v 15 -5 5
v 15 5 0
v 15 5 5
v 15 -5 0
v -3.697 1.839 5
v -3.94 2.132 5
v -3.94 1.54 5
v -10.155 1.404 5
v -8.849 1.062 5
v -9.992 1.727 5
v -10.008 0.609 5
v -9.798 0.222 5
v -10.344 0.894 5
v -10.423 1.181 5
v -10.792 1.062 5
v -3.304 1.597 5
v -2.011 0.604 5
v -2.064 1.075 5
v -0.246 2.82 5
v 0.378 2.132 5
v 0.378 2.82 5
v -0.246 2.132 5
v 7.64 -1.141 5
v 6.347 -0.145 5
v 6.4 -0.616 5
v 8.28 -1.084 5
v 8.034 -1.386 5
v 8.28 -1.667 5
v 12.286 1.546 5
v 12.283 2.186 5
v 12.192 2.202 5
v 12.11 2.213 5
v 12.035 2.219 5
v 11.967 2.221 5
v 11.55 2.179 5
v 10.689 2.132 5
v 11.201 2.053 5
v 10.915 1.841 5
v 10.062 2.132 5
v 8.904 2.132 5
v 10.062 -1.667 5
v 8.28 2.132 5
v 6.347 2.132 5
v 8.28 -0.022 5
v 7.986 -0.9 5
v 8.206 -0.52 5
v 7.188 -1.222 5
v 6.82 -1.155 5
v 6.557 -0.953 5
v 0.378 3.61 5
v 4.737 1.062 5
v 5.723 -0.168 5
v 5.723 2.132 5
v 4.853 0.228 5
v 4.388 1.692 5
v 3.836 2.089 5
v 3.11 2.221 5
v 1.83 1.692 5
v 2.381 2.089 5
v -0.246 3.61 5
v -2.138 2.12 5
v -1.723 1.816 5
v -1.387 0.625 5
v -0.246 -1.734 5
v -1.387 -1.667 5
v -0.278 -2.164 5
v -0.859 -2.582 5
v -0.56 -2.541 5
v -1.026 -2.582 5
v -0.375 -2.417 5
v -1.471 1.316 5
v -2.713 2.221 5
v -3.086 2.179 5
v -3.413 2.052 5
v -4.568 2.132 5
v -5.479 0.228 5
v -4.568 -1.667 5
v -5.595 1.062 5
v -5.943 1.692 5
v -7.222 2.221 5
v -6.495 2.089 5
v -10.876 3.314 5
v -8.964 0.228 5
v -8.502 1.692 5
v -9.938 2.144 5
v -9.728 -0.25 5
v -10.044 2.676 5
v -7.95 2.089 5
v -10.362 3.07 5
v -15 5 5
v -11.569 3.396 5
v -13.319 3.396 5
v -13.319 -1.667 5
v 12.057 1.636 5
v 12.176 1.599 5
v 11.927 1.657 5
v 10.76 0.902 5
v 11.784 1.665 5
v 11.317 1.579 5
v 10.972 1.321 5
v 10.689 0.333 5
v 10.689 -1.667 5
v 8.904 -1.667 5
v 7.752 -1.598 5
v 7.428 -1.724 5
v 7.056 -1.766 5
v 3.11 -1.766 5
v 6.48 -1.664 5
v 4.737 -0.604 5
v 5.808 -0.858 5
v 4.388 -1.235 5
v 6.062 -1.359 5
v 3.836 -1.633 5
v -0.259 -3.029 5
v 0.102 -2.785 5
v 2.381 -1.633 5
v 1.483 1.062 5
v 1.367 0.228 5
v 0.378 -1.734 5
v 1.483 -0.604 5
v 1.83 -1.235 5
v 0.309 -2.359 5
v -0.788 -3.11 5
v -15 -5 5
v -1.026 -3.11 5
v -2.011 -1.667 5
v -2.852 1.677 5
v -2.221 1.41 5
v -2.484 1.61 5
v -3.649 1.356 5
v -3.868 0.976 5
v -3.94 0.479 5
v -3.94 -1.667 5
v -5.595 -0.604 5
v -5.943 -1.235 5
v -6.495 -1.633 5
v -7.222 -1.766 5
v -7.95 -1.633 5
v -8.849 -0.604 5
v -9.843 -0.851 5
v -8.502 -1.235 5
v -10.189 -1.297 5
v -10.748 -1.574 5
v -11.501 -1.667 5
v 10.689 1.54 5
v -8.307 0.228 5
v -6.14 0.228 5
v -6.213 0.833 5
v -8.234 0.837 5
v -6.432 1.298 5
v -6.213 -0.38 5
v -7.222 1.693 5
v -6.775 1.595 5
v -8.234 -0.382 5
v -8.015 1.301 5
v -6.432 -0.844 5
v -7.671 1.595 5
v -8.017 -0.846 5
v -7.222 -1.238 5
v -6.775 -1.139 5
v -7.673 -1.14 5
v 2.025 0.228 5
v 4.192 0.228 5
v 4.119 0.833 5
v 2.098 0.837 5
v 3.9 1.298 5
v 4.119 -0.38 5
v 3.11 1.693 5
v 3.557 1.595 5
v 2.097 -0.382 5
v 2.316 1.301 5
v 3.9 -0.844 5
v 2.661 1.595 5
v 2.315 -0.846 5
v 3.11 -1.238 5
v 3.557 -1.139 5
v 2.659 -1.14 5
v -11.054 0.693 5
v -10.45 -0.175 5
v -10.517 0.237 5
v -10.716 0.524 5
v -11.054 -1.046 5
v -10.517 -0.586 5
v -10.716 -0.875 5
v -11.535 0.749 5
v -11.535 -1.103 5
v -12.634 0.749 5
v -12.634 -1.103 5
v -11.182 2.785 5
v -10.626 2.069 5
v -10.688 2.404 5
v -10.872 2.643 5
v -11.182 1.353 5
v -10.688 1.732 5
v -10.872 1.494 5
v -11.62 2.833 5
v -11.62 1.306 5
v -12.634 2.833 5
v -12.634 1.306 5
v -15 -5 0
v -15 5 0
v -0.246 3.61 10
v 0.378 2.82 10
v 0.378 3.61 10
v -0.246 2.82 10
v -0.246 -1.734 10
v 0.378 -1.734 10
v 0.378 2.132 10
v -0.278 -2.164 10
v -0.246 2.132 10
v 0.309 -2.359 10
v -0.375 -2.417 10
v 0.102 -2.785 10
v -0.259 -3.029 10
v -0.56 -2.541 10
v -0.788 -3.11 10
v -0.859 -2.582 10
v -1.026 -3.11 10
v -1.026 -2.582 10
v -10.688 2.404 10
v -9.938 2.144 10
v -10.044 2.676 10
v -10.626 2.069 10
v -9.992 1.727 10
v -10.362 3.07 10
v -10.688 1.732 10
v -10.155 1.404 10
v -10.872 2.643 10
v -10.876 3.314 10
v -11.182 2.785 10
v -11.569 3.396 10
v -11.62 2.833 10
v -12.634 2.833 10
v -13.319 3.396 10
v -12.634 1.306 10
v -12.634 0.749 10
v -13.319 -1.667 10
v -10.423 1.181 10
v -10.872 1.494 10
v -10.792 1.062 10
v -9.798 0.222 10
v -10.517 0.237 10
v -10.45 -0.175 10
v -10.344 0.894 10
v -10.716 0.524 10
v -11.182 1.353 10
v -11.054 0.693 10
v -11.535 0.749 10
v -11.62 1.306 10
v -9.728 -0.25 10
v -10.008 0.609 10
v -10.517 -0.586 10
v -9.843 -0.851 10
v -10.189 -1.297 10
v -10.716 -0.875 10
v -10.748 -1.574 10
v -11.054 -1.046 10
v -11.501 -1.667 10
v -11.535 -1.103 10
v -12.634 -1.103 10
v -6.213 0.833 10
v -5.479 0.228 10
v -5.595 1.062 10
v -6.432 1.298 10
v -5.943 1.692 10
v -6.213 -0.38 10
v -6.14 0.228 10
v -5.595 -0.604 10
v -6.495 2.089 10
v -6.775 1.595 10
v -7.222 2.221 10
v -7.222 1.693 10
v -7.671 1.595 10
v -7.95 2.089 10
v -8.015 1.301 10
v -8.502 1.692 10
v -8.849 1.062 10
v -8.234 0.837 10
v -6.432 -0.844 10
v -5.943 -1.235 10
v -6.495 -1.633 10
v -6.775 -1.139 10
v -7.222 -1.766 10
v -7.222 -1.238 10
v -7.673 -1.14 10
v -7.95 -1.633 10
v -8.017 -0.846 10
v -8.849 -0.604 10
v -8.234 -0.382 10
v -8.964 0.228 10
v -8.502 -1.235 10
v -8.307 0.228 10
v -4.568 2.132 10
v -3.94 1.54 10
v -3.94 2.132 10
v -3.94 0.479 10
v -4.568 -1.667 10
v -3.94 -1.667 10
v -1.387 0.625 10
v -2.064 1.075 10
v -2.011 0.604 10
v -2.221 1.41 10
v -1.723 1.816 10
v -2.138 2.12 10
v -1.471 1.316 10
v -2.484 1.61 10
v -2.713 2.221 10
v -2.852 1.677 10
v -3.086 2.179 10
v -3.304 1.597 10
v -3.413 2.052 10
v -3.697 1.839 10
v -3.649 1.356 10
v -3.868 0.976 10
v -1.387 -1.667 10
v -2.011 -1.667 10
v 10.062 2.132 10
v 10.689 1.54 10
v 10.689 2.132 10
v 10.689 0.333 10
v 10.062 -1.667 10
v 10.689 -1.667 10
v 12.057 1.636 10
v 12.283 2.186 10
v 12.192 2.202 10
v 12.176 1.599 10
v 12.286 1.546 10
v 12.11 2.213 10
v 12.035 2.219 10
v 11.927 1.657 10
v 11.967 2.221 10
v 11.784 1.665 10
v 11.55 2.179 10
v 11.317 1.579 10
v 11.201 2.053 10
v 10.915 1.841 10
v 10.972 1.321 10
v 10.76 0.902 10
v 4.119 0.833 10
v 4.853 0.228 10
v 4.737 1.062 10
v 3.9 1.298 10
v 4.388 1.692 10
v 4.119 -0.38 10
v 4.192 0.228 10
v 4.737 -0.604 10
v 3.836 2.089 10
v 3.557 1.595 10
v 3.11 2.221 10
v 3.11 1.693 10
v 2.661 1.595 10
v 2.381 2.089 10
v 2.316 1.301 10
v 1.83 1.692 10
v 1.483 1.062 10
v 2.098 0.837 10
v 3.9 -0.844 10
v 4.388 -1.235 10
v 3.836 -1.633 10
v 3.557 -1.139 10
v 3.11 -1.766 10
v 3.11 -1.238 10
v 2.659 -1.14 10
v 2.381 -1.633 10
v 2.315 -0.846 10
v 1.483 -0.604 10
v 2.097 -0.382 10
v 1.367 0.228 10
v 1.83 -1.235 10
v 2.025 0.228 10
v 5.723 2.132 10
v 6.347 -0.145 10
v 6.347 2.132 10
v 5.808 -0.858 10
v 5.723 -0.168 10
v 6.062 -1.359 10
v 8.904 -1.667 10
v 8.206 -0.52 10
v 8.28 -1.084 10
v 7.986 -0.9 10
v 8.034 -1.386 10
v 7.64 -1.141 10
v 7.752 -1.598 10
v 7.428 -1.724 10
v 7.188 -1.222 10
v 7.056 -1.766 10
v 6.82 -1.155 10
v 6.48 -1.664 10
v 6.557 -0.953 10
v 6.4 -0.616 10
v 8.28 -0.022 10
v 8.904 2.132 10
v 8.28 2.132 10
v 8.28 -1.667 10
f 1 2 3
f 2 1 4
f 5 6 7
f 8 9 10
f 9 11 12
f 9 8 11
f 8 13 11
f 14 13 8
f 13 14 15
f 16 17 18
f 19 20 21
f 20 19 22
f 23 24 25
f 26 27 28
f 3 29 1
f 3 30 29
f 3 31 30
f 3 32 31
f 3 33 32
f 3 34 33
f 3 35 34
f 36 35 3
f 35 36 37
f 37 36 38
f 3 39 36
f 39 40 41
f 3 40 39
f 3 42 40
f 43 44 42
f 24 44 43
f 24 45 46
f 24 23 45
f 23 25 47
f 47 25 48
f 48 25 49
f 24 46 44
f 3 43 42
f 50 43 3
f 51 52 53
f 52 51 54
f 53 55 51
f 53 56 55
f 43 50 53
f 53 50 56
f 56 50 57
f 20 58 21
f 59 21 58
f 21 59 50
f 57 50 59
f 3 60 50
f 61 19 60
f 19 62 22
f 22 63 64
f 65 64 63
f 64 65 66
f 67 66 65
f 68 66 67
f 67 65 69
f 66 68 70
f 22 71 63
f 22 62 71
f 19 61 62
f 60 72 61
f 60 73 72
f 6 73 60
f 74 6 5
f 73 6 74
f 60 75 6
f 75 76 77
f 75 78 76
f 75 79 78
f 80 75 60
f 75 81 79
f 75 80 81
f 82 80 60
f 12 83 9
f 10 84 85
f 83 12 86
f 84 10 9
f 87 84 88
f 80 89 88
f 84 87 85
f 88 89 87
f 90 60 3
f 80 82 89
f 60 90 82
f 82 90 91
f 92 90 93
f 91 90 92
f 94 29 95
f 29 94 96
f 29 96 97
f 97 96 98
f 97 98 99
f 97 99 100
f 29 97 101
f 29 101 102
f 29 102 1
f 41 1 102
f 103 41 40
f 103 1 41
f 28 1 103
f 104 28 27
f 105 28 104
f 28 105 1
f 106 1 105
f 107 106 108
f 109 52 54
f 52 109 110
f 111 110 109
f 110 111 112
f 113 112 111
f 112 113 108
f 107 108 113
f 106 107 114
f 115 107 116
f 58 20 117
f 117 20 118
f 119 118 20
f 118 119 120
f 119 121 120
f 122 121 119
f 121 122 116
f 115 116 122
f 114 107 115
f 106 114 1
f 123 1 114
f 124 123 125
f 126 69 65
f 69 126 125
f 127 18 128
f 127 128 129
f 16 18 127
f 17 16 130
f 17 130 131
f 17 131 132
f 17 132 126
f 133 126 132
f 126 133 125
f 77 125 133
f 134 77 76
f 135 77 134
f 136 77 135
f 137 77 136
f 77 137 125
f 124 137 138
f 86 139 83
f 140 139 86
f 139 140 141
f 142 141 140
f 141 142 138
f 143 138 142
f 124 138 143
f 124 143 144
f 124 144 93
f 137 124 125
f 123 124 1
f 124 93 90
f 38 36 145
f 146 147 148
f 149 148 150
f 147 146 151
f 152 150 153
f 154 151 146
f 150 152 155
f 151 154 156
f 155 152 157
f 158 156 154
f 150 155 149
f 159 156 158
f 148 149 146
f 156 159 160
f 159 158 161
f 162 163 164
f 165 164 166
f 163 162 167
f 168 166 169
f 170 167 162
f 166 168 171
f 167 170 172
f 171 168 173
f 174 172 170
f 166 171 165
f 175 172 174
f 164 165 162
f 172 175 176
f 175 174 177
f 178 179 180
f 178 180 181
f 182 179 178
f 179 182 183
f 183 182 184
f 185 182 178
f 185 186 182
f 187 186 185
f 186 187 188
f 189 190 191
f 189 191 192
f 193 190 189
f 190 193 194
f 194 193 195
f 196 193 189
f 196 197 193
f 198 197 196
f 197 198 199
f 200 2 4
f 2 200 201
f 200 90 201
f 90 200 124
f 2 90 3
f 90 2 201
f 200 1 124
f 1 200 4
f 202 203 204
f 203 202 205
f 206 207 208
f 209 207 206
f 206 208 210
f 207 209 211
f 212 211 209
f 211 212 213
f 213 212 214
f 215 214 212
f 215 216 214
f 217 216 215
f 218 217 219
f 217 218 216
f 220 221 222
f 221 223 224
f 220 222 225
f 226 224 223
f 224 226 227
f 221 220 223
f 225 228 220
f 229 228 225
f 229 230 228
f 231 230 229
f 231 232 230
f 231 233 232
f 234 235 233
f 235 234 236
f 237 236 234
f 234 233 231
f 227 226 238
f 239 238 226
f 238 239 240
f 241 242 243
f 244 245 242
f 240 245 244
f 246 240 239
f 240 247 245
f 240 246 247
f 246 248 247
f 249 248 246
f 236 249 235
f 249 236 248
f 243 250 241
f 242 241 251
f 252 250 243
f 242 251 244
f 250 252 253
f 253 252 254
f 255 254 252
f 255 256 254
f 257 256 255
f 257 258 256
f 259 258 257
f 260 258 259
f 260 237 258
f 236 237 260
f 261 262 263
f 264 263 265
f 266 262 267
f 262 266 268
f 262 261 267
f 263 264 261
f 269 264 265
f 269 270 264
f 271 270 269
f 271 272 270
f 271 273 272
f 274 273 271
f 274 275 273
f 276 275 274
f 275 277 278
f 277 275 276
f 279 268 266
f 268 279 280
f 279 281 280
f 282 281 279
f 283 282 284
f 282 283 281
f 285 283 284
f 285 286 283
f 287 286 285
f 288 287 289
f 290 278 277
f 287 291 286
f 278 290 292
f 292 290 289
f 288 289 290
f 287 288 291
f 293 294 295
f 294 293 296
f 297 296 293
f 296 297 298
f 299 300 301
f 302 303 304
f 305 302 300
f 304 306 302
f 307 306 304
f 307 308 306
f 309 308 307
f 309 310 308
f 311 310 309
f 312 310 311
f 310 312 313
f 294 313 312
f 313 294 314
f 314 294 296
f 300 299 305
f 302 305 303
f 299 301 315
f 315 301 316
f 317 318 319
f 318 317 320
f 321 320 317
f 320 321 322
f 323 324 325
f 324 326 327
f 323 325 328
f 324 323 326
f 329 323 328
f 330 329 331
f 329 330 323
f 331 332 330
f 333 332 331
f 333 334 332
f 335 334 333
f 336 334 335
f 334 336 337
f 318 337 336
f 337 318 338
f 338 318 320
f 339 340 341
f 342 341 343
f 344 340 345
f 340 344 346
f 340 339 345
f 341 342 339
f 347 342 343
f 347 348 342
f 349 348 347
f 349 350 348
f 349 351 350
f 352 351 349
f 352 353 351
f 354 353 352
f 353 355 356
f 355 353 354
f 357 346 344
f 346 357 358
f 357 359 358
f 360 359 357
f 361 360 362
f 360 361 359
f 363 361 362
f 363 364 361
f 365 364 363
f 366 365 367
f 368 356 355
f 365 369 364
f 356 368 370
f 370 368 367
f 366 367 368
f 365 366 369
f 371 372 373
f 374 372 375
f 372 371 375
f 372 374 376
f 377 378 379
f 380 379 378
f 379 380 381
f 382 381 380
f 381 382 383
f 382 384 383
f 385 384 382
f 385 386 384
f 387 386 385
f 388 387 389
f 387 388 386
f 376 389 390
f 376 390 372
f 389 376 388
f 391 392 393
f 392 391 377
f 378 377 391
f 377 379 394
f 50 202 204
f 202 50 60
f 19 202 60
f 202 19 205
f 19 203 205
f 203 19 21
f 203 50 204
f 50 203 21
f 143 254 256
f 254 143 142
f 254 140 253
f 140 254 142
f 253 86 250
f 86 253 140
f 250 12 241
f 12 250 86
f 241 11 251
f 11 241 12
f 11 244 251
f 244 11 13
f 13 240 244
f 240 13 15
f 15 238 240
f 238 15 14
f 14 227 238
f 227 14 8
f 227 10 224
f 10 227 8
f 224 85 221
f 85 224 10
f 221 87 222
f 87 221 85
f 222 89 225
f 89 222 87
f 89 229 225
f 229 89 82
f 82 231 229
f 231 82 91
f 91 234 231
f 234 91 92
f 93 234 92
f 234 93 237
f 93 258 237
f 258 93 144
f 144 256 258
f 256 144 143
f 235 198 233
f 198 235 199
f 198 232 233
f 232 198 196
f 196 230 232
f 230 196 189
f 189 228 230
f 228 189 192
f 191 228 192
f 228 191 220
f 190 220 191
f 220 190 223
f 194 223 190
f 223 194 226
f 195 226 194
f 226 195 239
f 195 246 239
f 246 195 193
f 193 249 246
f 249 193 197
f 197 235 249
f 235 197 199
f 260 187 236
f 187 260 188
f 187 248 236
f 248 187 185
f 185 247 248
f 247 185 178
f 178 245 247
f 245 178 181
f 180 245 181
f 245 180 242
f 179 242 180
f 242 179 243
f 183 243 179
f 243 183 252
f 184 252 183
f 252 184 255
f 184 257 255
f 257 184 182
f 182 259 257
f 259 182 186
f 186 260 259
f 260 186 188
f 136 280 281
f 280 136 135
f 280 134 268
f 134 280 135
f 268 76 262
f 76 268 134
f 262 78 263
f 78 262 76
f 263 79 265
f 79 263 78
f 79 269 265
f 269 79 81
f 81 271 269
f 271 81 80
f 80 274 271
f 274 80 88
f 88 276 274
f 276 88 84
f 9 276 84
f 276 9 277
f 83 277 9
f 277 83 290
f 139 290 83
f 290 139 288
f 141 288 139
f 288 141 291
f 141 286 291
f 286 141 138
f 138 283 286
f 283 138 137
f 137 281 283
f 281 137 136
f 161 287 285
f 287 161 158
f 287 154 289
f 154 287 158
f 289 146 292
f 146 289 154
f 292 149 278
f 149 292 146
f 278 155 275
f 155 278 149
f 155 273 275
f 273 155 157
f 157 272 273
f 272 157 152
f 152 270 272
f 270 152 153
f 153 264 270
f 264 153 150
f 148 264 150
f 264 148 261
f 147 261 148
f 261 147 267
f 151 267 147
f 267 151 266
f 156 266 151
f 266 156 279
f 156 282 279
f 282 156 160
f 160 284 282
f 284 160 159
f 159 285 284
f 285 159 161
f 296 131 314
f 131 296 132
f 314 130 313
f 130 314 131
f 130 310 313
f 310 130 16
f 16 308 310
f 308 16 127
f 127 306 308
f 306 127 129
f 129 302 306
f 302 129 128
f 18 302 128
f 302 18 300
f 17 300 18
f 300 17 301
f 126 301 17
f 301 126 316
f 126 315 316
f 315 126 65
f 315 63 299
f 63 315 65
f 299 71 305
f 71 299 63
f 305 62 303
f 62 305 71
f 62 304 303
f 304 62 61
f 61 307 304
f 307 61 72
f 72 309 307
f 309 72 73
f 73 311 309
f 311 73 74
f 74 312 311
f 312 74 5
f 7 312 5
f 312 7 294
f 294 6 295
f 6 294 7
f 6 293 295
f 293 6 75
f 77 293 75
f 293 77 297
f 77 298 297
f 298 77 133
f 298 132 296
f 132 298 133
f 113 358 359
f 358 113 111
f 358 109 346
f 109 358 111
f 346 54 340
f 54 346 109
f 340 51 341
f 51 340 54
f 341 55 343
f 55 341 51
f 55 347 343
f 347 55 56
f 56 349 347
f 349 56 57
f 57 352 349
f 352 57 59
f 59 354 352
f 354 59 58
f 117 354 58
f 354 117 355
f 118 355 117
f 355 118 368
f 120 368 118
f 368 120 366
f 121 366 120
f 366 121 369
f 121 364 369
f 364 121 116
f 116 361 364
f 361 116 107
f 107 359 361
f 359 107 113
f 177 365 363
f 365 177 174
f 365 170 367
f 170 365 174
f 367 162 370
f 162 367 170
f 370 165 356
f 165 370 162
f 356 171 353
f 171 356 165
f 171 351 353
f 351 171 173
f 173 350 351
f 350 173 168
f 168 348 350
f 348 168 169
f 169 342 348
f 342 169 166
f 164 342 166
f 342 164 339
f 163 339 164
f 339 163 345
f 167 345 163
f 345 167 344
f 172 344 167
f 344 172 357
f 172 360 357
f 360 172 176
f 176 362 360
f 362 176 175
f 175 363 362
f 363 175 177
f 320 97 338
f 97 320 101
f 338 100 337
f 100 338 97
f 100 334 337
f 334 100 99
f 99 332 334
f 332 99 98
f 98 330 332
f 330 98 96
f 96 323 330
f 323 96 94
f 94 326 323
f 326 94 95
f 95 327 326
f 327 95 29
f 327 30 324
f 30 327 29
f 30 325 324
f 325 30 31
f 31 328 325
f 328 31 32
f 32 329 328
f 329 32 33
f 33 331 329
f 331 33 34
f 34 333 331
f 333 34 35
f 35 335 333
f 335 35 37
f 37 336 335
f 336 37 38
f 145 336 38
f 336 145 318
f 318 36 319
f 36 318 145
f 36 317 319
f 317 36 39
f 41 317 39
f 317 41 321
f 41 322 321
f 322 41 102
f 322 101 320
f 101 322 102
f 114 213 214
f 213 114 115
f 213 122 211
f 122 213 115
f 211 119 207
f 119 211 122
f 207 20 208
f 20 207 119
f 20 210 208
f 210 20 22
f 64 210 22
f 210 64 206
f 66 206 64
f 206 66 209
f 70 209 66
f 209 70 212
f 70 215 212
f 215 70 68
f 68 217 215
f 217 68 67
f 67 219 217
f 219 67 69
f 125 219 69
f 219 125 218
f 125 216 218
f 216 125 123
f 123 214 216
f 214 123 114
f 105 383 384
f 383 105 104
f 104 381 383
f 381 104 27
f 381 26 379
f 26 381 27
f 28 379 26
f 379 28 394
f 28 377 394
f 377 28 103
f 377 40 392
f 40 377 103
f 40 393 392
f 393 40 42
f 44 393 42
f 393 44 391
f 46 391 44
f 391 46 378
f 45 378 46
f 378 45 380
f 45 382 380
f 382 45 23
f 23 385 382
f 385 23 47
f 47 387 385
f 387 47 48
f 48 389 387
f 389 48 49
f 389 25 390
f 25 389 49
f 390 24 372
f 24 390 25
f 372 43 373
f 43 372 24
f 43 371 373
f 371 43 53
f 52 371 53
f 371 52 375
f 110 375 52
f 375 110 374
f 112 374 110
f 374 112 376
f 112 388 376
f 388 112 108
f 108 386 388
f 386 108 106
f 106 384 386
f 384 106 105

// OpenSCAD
$fn = 2; 
texte_a_inserer = "Bonjour"; 
taille = 5; 
police = "DejaVuSans"; //[[Abril Fatface,Aclonica,Acme,Advent Pro,Akronim,Aladin,Alegreya,Alegreya Sans,Alegreya SC,Alex Brush,Alfa Slab One,Alice,Amaranth,Architects Daughter,Archivo Black,Archivo Narrow,Arimo,Arvo,Asap,Astloch,Asul,Averia Libre,Averia Serif Libre,Bangers,Basic,Belgrano,Berkshire Swash,Bigshot One,Bilbo Swash Caps,Black Ops One,Bonbon,Bowlby One SC,Brawler,Bubblegum Sans,Butterfly Kids,Cabin Condensed,Caesar Dressing,Cagliostro,Calligraffitti,Capriola,Carter One,Changa One,Chango,Chelsea Market,Cherry Cream Soda,Chewy,Chicle,Chivo,Clicker Script,Coming Soon,Concert One,Condiment,Cookie,Courgette,Covered By Your Grace,Crimson Text,Dancing Script,DejaVu Sans,DejaVu Serif,Dhurjati,Doppio One,Dosis,Droid Sans,Eagle Lake,Electrolize,Emilys Candy,Encode Sans,Encode Sans Compressed,Euphoria Script,Exo,Exo 2,Faster One,Federo,Finger Paint,Fjord One,Fontdiner Swanky,Freckle Face,Fruktur,Gabriela,Geo,Germania One,Give You Glory,Gloria Hallelujah,Goudy Bookletter 1911,Graduate,Grand Hotel,Great Vibes,Griffy,Hanalei Fill,Happy Monkey,Henny Penny,Hind,IM Fell English SC,Indie Flower,Irish Grover,Italianno,Jacques Francois Shadow,Jolly Lodger,Josefin Slab,Joti One,Judson,Just Another Hand,Kalam,Kameron,Karma,Kavoon,Knewave,Kranky,Kristi,Laila,Lakki Reddy,Lancelot,Lato,Leckerli One,Ledger,Lekton,Lemon One,Liberation Sans,Libre Caslon Text,Life Savers,Lilita One,Lily Script One,Limelight,Lobster,Lobster Two,Londrina Outline,Londrina Shadow,Londrina Solid,Lora,Love Ya Like A Sister,Loved by the King,Lovers Quarrel,Luckiest Guy,Lusitana,Macondo,Macondo Swash Caps,Mako,Marck Script,Margarine,Marko One,Maven Pro,McLaren,MedievalSharp,Merienda One,Merriweather,Mervale Script,Metal Mania,Metrophobic,Milonga,Miltonian Tattoo,Miss Fajardose,Molle,Montez,Montserrat,Mr De Haviland,Mystery Quest,Neucha,New Rocker,Niconne,Nosifer,Nothing You Could Do,Noto Sans Oriya,Noto Serif,Nova Square,Nunito,Old Standard TT,Oleo Script,Oleo Script Swash Caps,Orbitron,Oregano,Orienta,Original Surfer,Oswald,Over the Rainbow,Overlock,Oxygen,Pacifico,Paprika,Parisienne,Patrick Hand SC,Paytone One,Peralta,Permanent Marker,Piedra,Pirata One,Play,Playball,Poetsen One,Poppins,Press Start 2P,Princess Sofia,PT Mono,Qwigley,Racing Sans One,Raleway,Rancho,Ranga,Ribeye,Roboto,Roboto Condensed,Roboto Slab,Rochester,Rock Salt,Rubik One,Sail,Salsa,Sansita One,Sarina,Satisfy,Schoolbell,Seaweed Script,Sevillana,Shadows Into Light,Shadows Into Light Two,Share,Six Caps,Skranji,Source Sans Pro,Spicy Rice,Stardos Stencil,Stoke,Syncopate,Teko,Terminal Dosis,The Girl Next Door,Tillana,Timmana,Titillium Web,Ubuntu,Ultra,Underdog,UnifrakturCook,UnifrakturMaguntia,Vampiro One,Vidaloka,Viga,Voces,Volkhov,Vollkorn,Voltaire,Waiting for the Sunrise,Wallpoet,Wellfleet,Wendy One,Yellowtail,Yesteryear,Zeyada]]
hauteur = 5; 
longueur_cube = 30; 
largeur_cube = 10; 
hauteur_cube = 5; 
relief_extrusion = "relief"; //[relief,extru]
module rendu(){
linear_extrude(hauteur) text(texte_a_inserer,size = taille, font = police);
}
module finao(){
if ( relief_extrusion == "relief") {
   union(){
 translate([0,0,0])   cube([longueur_cube,largeur_cube,hauteur_cube]);
translate([1,(largeur_cube/3),hauteur_cube]) rendu();
   } 
}
else
{
difference(){
 translate([0,0,0])   cube([longueur_cube,largeur_cube,hauteur_cube]);
translate([1,(largeur_cube/3),(hauteur_cube -hauteur+0.1)]) rendu();
}
 }
}
translate ([-(longueur_cube/2),-(largeur_cube/2),0]) finao();
